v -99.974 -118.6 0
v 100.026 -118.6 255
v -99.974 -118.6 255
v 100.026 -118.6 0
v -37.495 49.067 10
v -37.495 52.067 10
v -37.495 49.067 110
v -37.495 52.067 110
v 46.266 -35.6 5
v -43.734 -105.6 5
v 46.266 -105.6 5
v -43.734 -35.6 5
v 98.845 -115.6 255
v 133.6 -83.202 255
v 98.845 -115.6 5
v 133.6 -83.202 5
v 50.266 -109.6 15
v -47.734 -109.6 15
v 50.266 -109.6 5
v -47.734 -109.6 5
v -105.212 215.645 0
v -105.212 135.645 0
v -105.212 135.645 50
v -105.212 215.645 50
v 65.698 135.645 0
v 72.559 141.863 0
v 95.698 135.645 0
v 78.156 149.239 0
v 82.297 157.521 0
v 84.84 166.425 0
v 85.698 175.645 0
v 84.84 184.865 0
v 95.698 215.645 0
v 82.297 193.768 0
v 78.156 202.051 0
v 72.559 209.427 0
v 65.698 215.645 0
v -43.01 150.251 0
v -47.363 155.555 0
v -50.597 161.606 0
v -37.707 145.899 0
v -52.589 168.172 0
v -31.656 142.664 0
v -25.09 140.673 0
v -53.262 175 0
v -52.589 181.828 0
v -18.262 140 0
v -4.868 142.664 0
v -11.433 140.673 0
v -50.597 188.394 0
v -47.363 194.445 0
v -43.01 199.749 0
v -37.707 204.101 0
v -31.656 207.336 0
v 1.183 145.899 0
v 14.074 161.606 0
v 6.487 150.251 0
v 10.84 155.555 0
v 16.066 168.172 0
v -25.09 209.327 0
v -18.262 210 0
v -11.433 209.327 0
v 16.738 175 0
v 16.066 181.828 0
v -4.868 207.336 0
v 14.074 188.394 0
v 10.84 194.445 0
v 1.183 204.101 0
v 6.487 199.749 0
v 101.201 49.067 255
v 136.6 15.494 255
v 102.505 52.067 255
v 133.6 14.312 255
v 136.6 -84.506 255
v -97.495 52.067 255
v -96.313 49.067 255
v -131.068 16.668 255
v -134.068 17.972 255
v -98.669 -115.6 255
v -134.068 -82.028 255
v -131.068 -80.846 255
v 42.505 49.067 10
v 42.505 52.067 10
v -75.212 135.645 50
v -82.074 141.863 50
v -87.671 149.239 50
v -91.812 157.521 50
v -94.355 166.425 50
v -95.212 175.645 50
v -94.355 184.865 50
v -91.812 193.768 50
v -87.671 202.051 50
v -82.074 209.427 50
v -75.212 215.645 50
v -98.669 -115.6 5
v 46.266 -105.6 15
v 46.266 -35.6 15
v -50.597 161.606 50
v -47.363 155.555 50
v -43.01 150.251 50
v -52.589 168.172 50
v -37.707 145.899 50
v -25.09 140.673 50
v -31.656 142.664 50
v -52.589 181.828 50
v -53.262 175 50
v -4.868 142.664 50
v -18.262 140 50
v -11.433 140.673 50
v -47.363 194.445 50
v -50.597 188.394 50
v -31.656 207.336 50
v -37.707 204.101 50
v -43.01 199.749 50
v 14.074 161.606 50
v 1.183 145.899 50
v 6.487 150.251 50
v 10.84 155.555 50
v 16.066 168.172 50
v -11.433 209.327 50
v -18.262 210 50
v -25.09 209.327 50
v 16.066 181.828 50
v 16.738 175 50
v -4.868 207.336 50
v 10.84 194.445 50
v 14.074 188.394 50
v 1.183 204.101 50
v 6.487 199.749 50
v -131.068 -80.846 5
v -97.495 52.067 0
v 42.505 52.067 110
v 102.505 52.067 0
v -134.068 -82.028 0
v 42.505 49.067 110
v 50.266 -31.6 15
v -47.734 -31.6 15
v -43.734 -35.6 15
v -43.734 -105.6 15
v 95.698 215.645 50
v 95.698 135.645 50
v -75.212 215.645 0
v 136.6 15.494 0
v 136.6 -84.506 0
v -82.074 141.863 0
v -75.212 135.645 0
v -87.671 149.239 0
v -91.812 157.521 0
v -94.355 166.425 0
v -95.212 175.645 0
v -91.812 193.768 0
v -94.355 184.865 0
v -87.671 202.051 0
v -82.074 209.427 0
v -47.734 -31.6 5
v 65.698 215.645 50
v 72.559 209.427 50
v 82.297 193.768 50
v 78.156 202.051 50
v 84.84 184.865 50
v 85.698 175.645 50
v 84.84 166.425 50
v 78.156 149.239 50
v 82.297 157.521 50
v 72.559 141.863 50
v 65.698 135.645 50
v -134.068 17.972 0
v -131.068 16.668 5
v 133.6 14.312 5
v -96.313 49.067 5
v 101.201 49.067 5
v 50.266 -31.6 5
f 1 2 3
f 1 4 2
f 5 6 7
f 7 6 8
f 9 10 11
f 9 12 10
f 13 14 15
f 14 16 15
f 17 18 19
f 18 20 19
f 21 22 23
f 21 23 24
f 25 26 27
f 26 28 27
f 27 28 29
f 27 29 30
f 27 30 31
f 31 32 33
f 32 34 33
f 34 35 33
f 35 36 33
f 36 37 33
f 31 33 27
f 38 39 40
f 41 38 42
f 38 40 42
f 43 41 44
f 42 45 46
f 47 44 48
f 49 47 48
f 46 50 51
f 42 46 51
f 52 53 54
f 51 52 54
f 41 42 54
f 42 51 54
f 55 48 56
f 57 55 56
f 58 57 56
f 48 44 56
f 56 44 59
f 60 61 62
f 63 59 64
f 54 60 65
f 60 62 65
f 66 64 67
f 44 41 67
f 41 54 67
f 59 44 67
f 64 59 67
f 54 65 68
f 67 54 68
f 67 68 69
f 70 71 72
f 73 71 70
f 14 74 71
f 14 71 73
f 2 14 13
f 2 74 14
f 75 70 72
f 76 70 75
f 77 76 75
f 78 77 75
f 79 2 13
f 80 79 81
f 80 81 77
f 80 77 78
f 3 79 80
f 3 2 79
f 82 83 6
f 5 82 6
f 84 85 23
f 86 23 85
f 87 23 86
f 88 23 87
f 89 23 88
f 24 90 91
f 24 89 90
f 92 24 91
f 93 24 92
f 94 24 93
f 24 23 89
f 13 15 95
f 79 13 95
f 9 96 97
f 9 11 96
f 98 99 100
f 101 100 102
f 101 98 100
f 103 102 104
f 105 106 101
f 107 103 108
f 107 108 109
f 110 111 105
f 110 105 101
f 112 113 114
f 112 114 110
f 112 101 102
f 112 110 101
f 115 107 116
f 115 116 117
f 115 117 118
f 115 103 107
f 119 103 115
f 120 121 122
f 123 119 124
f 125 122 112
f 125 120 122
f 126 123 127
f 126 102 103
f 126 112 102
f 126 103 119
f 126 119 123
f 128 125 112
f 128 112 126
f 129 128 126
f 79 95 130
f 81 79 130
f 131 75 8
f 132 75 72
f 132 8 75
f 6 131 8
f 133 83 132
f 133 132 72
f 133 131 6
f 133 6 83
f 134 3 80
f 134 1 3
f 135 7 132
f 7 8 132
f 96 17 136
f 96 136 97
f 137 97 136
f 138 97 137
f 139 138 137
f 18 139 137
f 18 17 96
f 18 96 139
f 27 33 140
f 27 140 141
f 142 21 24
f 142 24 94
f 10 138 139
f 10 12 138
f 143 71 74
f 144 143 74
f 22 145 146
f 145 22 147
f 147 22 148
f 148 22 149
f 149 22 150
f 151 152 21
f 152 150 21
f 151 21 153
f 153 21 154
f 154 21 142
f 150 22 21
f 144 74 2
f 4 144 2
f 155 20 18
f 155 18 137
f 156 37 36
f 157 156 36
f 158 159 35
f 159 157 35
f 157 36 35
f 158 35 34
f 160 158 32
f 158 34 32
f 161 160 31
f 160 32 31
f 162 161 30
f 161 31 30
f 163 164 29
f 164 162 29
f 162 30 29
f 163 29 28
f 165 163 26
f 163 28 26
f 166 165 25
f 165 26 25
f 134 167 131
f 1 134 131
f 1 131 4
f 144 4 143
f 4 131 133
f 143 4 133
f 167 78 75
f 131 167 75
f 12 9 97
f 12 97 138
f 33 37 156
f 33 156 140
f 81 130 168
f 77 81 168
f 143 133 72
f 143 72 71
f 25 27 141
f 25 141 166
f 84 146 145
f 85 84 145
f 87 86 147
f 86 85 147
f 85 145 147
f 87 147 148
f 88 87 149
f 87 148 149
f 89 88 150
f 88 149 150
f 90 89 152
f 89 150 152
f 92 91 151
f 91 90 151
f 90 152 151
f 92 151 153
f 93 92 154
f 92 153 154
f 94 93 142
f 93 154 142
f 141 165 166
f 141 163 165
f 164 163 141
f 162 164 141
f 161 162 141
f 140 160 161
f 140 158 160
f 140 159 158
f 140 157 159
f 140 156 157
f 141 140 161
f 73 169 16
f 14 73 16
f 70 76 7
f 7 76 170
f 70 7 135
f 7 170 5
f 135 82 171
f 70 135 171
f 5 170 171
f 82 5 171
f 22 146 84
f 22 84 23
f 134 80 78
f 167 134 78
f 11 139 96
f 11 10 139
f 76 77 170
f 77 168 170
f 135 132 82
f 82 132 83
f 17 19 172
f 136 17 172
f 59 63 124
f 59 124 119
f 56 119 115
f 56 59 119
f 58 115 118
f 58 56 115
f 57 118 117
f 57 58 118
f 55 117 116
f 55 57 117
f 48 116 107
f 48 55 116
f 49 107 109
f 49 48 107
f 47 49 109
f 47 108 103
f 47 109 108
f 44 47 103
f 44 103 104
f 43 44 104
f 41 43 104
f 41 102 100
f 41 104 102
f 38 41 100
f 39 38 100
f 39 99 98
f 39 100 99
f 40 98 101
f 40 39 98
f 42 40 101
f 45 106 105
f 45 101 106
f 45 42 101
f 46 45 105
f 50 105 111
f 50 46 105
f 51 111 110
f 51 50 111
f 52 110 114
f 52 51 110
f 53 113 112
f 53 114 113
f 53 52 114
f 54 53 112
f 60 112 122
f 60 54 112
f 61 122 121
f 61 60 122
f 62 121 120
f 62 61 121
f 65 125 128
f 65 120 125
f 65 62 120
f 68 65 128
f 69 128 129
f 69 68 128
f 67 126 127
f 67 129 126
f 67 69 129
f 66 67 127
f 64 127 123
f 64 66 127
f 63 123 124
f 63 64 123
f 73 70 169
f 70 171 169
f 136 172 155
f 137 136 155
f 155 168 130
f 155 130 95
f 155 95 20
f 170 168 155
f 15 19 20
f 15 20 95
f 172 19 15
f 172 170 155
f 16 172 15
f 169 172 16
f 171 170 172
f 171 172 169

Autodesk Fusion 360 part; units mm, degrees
sketch "Esquisse1" plane through (0, 0, 0) normal (0, 0, 1) x (1, 0, 0)
  line L0 (-97.4947, 52.0667) -> (102.5053, 52.0667)
  line L1 (102.5053, 52.0667) -> (136.5995, 15.4937)
  line L2 (136.5995, 15.4937) -> (136.5995, -84.5063)
  line L3 (136.5995, -84.5063) -> (100.0264, -118.6005)
  line L4 (100.0264, -118.6005) -> (-99.9736, -118.6005)
  line L5 (-99.9736, -118.6005) -> (-134.0677, -82.0275)
  line L6 (-134.0677, -82.0275) -> (-134.0677, 17.9725)
  line L7 (-134.0677, 17.9725) -> (-97.4947, 52.0667)
  circle A0 centre (-18.2616, 175) radius 35
  line L8 (95.6977, 135.6449) -> (65.6977, 135.6449)
  line L9 (65.6977, 135.6449) -> (65.6977, 215.6449)
  line L10 (65.6977, 215.6449) -> (95.6977, 215.6449)
  line L11 (95.6977, 215.6449) -> (95.6977, 135.6449)
  line L12 (-105.2122, 215.6449) -> (-75.2122, 215.6449)
  line L13 (-105.2122, 135.6449) -> (-105.2122, 215.6449)
  line L14 (-75.2122, 215.6449) -> (-75.2122, 135.6449)
  line L15 (-75.2122, 135.6449) -> (-105.2122, 135.6449)
  arc A1 (65.6977, 135.6449) -> (65.6977, 215.6449) centre (35.6977, 175.6449) ccw
  arc A2 (-75.2122, 215.6449) -> (-75.2122, 135.6449) centre (-45.2122, 175.6449) ccw
  dimension "d1" = 100
  dimension "d4" = 200
  dimension "d5" = 50
  dimension "d6" = 170.6672
  dimension "d7" = 270.6672
  dimension "d44" = 70
  dimension "d48" = 30
  dimension "d49" = 80
  dimension "d52" = 30
  dimension "d53" = 80
  dimension "d57" = 60
  dimension "d58" = 60
extrude "Extrusion1" add sketch "Esquisse1" along normal blind 5 contours L0 L1 L2 L3 L4 L5 L6 L7 makes body 1
sketch "Esquisse4" plane through (0, 0, 5) normal (0, 0, 1) x (-1, 0, 0)
  line L0 (134.0677, -17.9725) -> (134.0677, 82.0275)
  line L1 (134.0677, 82.0275) -> (99.9736, 118.6005)
  line L2 (99.9736, 118.6005) -> (-100.0264, 118.6005)
  line L3 (-100.0264, 118.6005) -> (-136.5995, 84.5063)
  line L4 (-136.5995, 84.5063) -> (-136.5995, -15.4937)
  line L5 (-136.5995, -15.4937) -> (-102.5053, -52.0667)
  line L6 (-102.5053, -52.0667) -> (97.4947, -52.0667)
  line L7 (97.4947, -52.0667) -> (134.0677, -17.9725)
  line L8 (96.3133, -49.0667) -> (-101.2006, -49.0667)
  line L9 (97.4947, -52.0667) -> (-102.5053, -52.0667)
  line L10 (-101.2006, -49.0667) -> (-133.5995, -14.3122)
  line L11 (-133.5995, -14.3122) -> (-133.5995, 83.2016)
  line L12 (-102.5053, -52.0667) -> (-136.5995, -15.4937)
  line L13 (-136.5995, -15.4937) -> (-136.5995, 84.5063)
  line L14 (-133.5995, 83.2016) -> (-98.845, 115.6005)
  line L15 (-98.845, 115.6005) -> (98.6688, 115.6005)
  line L16 (98.6688, 115.6005) -> (131.0677, 80.846)
  line L17 (131.0677, 80.846) -> (131.0677, -16.6678)
  line L18 (131.0677, -16.6678) -> (96.3133, -49.0667)
  line L19 (-136.5995, 84.5063) -> (-100.0264, 118.6005)
  line L20 (-100.0264, 118.6005) -> (99.9736, 118.6005)
  line L21 (99.9736, 118.6005) -> (134.0677, 82.0275)
  line L22 (134.0677, 82.0275) -> (134.0677, -17.9725)
  line L23 (134.0677, -17.9725) -> (97.4947, -52.0667)
  line L24 (43.7344, 105.6005) -> (-46.2656, 105.6005)
  line L25 (-46.2656, 105.6005) -> (-46.2656, 35.6005)
  line L26 (-46.2656, 35.6005) -> (43.7344, 35.6005)
  line L27 (43.7344, 35.6005) -> (43.7344, 105.6005)
  line L28 (47.7344, 35) -> (47.7344, 105)
  line L29 (47.7344, 105) -> (47.7344, 109.6005)
  line L30 (47.7344, 109.6005) -> (-50.2656, 109.6005)
  line L31 (-50.2656, 109.6005) -> (-50.2656, 31.6005)
  line L32 (-50.2656, 31.6005) -> (47.7344, 31.6005)
  line L33 (47.7344, 31.6005) -> (47.7344, 35)
  dimension "d10" = 3
  dimension "d11" = 3
  dimension "d12" = 3
  dimension "d14" = 3
  dimension "d16" = 3
  dimension "d18" = 3
  dimension "d19" = 3
  dimension "d21" = 3
  dimension "d24" = 70
  dimension "d25" = 90
  dimension "d26" = 10
  dimension "d27" = 4
  dimension "d28" = 4
  dimension "d29" = 4
  dimension "d30" = 4
  dimension "d35" = 83.3333
  dimension "d36" = 83.3339
extrude "Extrusion2" add sketch "Esquisse4" along normal blind 250 contours L0 L1 L2 L3 L4 L5 L6 L7 L9 L12 L13 L19 L20 L21 L22 L23 bodies 1
extrude "Extrusion3" add sketch "Esquisse4" along normal blind 5 contours L28 L29 L30 L31 L32 L33 bodies 1
extrude "Extrusion4" add 1 faces at (16.2656, -108.2672, 10) along direction (0, 0, 1) blind 5 on bodies 1 bodies 1
sketch "Esquisse5" plane through (0, 52.0667, 0) normal (0, 1, 0) x (-1, 0, 0)
  line L0 (-102.5053, 0) -> (97.4947, 0)
  line L1 (97.4947, 0) -> (97.4947, 255)
  line L2 (97.4947, 255) -> (-102.5053, 255)
  line L3 (-102.5053, 255) -> (-102.5053, 0)
  line L4 (-42.5053, 10) -> (37.4947, 10)
  line L5 (37.4947, 10) -> (37.4947, 110)
  line L6 (37.4947, 110) -> (-42.5053, 110)
  line L7 (-42.5053, 110) -> (-42.5053, 10)
  line L8 (97.4947, 0) -> (-102.5053, 0)
  dimension "d37" = 10
  dimension "d38" = 80
  dimension "d39" = 100
  dimension "d40" = 60
  dimension "d41" = 60
extrude "Extrusion5" cut sketch "Esquisse5" against normal blind 20 contours L4 L5 L6 L7 bodies 1
extrude "Extrusion6" add sketch "Esquisse1" along normal blind 50 separate body contours A0 makes body 2
extrude "Extrusion7" add sketch "Esquisse1" along normal blind 50 separate body contours L8 L10 L11 A1 | L12 L13 L15 A2 makes body 3 at (-94.5212, 183.9284, 33.3333) makes body 4 at (69.3607, 212.6152, 33.3333)
